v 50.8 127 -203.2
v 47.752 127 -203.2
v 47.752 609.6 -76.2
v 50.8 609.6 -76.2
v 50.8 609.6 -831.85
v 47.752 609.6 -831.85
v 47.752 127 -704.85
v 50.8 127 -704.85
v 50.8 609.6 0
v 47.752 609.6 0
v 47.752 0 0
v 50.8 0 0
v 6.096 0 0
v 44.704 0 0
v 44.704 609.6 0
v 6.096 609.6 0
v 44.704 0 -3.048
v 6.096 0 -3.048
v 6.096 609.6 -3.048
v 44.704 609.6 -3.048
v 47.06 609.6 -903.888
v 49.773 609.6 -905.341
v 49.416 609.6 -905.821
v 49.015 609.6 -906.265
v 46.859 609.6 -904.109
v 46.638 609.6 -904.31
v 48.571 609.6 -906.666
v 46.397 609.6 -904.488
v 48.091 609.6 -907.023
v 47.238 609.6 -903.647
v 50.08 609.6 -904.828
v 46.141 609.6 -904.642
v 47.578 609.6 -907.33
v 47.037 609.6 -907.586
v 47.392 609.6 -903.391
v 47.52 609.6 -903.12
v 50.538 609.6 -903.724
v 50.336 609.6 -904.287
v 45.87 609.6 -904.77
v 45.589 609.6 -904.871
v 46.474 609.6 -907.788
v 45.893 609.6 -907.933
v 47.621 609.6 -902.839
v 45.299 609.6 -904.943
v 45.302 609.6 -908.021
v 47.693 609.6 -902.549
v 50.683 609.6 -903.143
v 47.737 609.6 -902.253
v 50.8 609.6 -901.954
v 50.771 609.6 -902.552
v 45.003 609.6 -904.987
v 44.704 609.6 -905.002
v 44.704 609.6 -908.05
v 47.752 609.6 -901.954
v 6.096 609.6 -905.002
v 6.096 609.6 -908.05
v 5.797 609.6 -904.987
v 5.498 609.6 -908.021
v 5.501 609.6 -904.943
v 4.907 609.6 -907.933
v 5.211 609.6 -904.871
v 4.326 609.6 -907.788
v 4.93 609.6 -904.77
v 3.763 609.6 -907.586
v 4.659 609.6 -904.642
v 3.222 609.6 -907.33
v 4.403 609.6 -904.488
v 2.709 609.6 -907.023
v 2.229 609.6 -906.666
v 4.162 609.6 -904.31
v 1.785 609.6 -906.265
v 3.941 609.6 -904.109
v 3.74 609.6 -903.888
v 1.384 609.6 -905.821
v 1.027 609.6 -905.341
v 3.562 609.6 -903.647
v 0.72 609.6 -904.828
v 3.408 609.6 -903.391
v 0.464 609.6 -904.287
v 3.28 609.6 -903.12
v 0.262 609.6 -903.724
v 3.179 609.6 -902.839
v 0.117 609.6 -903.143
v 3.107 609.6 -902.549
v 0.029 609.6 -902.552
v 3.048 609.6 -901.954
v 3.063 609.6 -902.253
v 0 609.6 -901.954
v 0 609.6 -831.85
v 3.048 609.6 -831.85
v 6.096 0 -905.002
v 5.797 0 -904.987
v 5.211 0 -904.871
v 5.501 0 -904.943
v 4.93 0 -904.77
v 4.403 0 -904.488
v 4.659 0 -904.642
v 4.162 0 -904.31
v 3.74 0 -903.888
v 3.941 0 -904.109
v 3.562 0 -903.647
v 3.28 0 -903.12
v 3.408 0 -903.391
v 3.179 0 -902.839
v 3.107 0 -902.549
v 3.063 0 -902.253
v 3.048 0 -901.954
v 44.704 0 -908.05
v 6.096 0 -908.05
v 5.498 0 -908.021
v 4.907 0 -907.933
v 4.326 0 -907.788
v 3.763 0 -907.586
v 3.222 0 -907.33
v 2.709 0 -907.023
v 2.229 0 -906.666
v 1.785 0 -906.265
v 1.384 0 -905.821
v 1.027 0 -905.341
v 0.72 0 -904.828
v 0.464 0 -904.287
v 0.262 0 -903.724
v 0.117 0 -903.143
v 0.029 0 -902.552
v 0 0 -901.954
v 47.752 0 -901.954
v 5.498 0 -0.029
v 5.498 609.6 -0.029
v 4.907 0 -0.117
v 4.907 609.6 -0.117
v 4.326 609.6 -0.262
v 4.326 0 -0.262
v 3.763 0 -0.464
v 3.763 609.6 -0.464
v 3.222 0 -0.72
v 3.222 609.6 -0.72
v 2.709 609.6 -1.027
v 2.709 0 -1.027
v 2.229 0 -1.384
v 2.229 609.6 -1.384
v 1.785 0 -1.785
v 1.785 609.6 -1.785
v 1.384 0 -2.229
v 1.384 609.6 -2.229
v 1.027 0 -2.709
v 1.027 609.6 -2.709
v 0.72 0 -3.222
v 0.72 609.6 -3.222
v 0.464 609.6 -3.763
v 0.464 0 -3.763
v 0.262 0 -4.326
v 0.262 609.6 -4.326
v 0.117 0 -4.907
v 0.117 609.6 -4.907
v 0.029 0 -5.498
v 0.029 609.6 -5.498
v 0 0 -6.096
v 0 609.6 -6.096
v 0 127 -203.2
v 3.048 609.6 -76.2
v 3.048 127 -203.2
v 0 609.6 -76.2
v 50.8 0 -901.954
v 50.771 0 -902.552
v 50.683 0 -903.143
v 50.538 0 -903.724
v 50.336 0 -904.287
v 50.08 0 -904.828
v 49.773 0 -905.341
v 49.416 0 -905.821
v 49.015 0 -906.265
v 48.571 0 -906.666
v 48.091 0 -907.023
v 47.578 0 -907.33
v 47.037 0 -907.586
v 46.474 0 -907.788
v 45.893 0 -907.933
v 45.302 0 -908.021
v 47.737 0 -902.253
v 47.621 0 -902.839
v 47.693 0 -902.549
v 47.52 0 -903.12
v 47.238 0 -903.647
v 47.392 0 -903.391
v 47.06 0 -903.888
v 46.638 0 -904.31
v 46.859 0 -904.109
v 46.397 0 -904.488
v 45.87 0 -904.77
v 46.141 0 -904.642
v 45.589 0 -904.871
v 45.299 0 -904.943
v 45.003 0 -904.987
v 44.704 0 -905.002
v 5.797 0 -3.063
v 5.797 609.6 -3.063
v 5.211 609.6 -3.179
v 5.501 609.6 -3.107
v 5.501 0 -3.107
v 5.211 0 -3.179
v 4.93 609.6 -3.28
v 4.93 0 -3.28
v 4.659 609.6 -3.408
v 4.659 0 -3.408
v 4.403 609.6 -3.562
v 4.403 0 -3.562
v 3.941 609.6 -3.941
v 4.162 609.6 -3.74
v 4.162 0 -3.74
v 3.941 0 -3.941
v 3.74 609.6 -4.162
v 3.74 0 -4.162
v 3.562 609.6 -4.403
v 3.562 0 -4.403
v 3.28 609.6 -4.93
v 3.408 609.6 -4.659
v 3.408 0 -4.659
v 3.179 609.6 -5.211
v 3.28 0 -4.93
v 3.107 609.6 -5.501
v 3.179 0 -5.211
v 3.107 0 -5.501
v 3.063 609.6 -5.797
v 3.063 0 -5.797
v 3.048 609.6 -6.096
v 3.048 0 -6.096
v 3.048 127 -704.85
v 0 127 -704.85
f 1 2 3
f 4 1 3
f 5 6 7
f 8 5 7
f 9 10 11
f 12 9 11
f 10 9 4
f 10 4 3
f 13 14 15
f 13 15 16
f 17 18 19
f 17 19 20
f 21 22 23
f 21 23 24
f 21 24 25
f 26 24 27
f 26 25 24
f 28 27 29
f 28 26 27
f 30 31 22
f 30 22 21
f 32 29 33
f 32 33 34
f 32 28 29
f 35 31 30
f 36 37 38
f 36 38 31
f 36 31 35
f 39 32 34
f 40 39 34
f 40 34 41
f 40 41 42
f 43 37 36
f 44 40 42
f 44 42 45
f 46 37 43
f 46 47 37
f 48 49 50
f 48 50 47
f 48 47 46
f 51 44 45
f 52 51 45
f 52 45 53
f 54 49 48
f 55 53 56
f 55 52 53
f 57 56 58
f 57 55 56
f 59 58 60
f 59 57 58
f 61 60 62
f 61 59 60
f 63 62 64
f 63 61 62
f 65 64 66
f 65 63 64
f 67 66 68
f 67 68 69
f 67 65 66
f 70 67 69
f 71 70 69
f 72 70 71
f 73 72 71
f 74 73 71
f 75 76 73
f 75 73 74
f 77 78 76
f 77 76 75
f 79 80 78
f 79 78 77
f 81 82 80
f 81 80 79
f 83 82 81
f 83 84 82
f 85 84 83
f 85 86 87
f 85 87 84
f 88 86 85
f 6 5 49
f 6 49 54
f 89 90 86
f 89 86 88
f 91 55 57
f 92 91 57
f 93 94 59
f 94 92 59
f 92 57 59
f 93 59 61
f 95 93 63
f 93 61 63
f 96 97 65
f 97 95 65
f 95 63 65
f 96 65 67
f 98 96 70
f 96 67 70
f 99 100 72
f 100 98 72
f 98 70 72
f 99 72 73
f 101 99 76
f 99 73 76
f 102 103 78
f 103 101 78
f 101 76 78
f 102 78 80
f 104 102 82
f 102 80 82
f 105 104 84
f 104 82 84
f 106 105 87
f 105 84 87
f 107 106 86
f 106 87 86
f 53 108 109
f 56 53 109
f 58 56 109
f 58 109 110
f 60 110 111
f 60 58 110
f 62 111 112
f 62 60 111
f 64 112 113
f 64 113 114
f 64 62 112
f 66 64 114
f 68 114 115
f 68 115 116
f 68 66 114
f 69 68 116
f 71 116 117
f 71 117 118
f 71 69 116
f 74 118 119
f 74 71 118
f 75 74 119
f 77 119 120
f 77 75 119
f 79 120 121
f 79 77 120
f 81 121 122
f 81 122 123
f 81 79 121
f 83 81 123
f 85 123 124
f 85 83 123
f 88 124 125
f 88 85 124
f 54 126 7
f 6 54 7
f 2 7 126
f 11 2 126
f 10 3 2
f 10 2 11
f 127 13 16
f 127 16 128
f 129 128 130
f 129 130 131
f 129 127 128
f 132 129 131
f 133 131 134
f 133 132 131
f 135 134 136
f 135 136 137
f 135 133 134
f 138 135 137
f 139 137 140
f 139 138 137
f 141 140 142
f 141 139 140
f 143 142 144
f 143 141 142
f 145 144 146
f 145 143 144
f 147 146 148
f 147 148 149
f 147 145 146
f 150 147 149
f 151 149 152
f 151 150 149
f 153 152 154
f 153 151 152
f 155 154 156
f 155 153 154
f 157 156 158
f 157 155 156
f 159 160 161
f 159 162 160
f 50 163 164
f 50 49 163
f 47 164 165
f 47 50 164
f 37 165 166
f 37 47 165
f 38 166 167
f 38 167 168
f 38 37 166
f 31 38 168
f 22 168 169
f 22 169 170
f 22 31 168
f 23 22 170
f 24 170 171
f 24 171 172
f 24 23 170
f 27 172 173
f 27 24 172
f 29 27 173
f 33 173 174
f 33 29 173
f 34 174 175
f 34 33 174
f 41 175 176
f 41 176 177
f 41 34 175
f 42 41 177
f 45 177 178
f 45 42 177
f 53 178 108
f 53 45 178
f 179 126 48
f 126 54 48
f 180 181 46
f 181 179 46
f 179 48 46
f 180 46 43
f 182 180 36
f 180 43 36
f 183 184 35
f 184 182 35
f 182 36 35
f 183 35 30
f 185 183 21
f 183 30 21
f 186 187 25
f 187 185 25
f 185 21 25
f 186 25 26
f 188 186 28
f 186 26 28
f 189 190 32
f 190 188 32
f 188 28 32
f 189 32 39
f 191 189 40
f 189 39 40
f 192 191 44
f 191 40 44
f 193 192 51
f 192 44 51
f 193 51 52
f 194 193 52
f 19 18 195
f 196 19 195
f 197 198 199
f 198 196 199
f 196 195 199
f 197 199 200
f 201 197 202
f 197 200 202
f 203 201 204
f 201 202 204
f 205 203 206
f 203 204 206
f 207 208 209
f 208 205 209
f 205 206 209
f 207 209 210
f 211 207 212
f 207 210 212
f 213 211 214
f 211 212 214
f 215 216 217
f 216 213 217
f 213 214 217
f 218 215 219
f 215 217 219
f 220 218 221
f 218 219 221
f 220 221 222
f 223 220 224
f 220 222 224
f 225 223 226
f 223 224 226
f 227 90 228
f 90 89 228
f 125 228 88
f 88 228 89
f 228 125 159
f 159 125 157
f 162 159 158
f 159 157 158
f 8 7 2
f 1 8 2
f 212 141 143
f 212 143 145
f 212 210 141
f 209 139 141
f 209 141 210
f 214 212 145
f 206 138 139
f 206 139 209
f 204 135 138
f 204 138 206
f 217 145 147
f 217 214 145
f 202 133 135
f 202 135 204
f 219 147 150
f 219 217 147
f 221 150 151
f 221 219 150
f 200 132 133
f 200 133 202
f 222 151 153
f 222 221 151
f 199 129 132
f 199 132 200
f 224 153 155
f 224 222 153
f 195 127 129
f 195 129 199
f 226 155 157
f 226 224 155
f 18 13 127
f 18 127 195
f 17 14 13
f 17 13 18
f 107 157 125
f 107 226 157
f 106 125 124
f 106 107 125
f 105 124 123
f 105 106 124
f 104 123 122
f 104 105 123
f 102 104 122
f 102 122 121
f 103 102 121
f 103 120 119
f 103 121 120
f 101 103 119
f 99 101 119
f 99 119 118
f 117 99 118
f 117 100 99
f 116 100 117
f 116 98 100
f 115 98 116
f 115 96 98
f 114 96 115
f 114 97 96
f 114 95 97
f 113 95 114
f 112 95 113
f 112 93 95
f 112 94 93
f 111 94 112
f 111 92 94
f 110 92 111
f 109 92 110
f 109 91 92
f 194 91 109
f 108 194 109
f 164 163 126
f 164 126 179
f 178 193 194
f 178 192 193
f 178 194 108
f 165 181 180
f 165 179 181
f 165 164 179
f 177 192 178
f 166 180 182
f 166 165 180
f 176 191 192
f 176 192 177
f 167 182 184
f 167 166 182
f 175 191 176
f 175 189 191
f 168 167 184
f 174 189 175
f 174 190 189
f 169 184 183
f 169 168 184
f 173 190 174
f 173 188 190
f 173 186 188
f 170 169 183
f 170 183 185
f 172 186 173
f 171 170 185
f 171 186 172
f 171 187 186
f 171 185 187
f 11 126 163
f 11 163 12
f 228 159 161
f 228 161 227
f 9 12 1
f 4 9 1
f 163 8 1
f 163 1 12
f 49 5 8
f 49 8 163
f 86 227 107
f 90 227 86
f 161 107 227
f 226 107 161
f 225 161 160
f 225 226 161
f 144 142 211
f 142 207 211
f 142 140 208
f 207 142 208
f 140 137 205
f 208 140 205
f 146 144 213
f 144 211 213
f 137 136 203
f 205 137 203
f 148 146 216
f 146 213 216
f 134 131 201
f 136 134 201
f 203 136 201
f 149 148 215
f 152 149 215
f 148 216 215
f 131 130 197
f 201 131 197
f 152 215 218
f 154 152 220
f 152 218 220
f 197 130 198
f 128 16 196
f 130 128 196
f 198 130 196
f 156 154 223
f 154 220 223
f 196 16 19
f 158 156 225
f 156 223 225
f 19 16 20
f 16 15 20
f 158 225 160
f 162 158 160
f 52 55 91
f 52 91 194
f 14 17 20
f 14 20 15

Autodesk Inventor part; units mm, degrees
ref_plane "YZ Plane" through (0, 0, 0) normal (1, 0, 0) x (0, 1, 0)
ref_plane "XZ Plane" through (0, 0, 0) normal (0, 1, 0) x (-1, 0, 0)
ref_plane "XY Plane" through (0, 0, 0) normal (0, 0, 1) x (1, 0, 0)
sketch "Sketch1" plane through (0, 0, 0) normal (1, 0, 0) x (0, 1, 0)
  line L0 (0, 0) -> (609.6, 0)
  line L1 (609.6, 0) -> (609.6, -908.05)
  line L2 (609.6, -908.05) -> (0, -908.05)
  line L3 (0, -908.05) -> (0, 0)
  line L4 (127, 0) -> (127, -908.05)
  line L5 (609.6, 0) -> (127, -127)
  line L6 (609.6, -908.05) -> (127, -781.05)
  line L7 (609.6, -76.2) -> (127, -203.2)
  line L8 (609.6, -831.85) -> (127, -704.85)
  dimension "d0" = 609.6
  dimension "d1" = 908.05
  dimension "d2" = 127
  dimension "d3" = 127
  dimension "d4" = 127
  dimension "d6" = 76.2
  dimension "d7" = 76.2
extrude "Plate1" add sketch "Sketch1" along normal blind 3.048 contours L0 L4 L2 L3 | L0 L5 L4 | L1 L7 L4 L5 | L4 L6 L2 | L6 L4 L8 L1
sketch "Sketch2" plane through (0, 609.6, -905.002) normal (0, 0, -1) x (-1, 0, 0)
  line L0 (0, -609.6) -> (0, 0)
  line L1 (0, 0) -> (-50.8, 0)
  line L2 (-50.8, 0) -> (-50.8, -609.6)
  line L3 (-50.8, -609.6) -> (0, -609.6)
edge flange "Flange1" height 50.8 angle 90 thickness 3.048 bend radius 3.048 thickness toward (0, 0, -1) relief tear relief width 3.048 relief depth 1.524 edges at (3.048, 304.8, -908.05) wall of the first edge with corners at (0, 0, -905.002) (0, 609.6, -905.002) (50.8, 609.6, -905.002) (50.8, 0, -905.002)
bend "Bend1"
corner "Corner1"
sketch "Sketch3" plane through (47.752, 609.6, -908.05) normal (1, 0, 0) x (0, 1, 0)
  line L0 (-609.6, 0) -> (0, 0)
  line L1 (0, 0) -> (0, 939.8)
  line L2 (0, 939.8) -> (-609.6, 939.8)
  line L3 (-609.6, 939.8) -> (-609.6, 0)
edge flange "Flange2" height 939.8 angle 90 thickness 3.048 bend radius 3.048 thickness toward (1, 0, 0) relief tear relief width 3.048 relief depth 1.524 edges at (50.8, 304.8, -905.002) wall of the first edge with corners at (47.752, 0, -908.05) (47.752, 609.6, -908.05) (47.752, 609.6, 31.75) (47.752, 0, 31.75)
bend "Bend2"
corner "Corner2"
sketch "Sketch4" plane through (0, 0, 0) normal (-1, 0, 0) x (0, 0, 1)
  line L0 (-901.954, 609.6) -> (-901.954, 0) projected
  line L1 (0, 0) -> (-901.954, 0) projected
  line L2 (0, 609.6) -> (0, 0) projected
  line L3 (-76.2, 609.6) -> (0, 609.6) projected
  line L4 (-203.2, 127) -> (-76.2, 609.6) projected
  line L5 (-704.85, 127) -> (-203.2, 127) projected
  line L6 (-831.85, 609.6) -> (-704.85, 127) projected
  line L7 (-901.954, 609.6) -> (-831.85, 609.6) projected
  line L8 (-908.05, 0) -> (-908.05, 609.6) projected
  line L9 (-901.954, 609.6) -> (-908.05, 609.6) projected
  line L10 (-908.05, 0) -> (-901.954, 0) projected
  line L11 (-908.05, 0) -> (-908.05, 609.6) projected
  line L12 (-901.954, 0) -> (-908.05, 0) projected
  line L13 (-901.954, 609.6) -> (-901.954, 0) projected
  line L14 (-908.05, 609.6) -> (-901.954, 609.6) projected
extrude "Extrusion1" cut sketch "Sketch4" against normal blind 76.2 keep common part
sketch "Sketch5" plane through (0, 0, -3.048) normal (0, 0, 1) x (1, 0, 0)
  line L0 (0, 609.6) -> (0, 0)
  line L1 (0, 0) -> (44.704, 0)
  line L2 (44.704, 0) -> (44.704, 609.6)
  line L3 (44.704, 609.6) -> (0, 609.6)
edge flange "Flange3" height 44.704 angle 90 thickness 3.048 bend radius 3.048 thickness toward (0, 0, 1) relief tear relief width 3.048 relief depth 1.524 edges at (3.048, 304.8, 0) wall of the first edge with corners at (0, 609.6, -3.048) (0, 0, -3.048) (44.704, 0, -3.048) (44.704, 609.6, -3.048)
bend "Bend3"
corner "Corner3"
equation "\"d8\" = Thickness"
equation "\"d9\" = BendReliefWidth"
equation "\"d10\" = BendReliefDepth"
equation "\"d11\" = MinimumRemnant"
equation "\"d12\" = TransitionRadius"
equation "\"d15\" = BendRadius"
equation "\"d16\" = CornerReliefSize"
equation "\"d17\" = GapSize"
equation "\"d18\" = JacobiRadiusSize"
equation "\"d19\" = BendReliefWidth"
equation "\"d20\" = BendReliefDepth"
equation "\"d21\" = MinimumRemnant"
equation "\"d22\" = TransitionRadius"
equation "\"d25\" = BendRadius"
equation "\"d26\" = CornerReliefSize"
equation "\"d27\" = GapSize"
equation "\"d28\" = JacobiRadiusSize"
equation "\"d31\" = BendReliefWidth"
equation "\"d32\" = BendReliefDepth"
equation "\"d33\" = MinimumRemnant"
equation "\"d34\" = TransitionRadius"
equation "\"d37\" = BendRadius"
equation "\"d38\" = CornerReliefSize"
equation "\"d39\" = GapSize"
equation "\"d40\" = JacobiRadiusSize"
equation "\"BendRadius\" = Thickness"
equation "\"BendReliefWidth\" = Thickness"
equation "\"BendReliefDepth\" = 0.5 * Thickness"
equation "\"CornerReliefSize\" = 4 * Thickness"
equation "\"MinimumRemnant\" = 2 * Thickness"
equation "\"TransitionRadius\" = BendRadius"
equation "\"JacobiRadiusSize\" = BendRadius"
equation "\"GapSize\" = Thickness"
equation "\"Thickness\" = 3.048"
properties part number "Div_Big"
